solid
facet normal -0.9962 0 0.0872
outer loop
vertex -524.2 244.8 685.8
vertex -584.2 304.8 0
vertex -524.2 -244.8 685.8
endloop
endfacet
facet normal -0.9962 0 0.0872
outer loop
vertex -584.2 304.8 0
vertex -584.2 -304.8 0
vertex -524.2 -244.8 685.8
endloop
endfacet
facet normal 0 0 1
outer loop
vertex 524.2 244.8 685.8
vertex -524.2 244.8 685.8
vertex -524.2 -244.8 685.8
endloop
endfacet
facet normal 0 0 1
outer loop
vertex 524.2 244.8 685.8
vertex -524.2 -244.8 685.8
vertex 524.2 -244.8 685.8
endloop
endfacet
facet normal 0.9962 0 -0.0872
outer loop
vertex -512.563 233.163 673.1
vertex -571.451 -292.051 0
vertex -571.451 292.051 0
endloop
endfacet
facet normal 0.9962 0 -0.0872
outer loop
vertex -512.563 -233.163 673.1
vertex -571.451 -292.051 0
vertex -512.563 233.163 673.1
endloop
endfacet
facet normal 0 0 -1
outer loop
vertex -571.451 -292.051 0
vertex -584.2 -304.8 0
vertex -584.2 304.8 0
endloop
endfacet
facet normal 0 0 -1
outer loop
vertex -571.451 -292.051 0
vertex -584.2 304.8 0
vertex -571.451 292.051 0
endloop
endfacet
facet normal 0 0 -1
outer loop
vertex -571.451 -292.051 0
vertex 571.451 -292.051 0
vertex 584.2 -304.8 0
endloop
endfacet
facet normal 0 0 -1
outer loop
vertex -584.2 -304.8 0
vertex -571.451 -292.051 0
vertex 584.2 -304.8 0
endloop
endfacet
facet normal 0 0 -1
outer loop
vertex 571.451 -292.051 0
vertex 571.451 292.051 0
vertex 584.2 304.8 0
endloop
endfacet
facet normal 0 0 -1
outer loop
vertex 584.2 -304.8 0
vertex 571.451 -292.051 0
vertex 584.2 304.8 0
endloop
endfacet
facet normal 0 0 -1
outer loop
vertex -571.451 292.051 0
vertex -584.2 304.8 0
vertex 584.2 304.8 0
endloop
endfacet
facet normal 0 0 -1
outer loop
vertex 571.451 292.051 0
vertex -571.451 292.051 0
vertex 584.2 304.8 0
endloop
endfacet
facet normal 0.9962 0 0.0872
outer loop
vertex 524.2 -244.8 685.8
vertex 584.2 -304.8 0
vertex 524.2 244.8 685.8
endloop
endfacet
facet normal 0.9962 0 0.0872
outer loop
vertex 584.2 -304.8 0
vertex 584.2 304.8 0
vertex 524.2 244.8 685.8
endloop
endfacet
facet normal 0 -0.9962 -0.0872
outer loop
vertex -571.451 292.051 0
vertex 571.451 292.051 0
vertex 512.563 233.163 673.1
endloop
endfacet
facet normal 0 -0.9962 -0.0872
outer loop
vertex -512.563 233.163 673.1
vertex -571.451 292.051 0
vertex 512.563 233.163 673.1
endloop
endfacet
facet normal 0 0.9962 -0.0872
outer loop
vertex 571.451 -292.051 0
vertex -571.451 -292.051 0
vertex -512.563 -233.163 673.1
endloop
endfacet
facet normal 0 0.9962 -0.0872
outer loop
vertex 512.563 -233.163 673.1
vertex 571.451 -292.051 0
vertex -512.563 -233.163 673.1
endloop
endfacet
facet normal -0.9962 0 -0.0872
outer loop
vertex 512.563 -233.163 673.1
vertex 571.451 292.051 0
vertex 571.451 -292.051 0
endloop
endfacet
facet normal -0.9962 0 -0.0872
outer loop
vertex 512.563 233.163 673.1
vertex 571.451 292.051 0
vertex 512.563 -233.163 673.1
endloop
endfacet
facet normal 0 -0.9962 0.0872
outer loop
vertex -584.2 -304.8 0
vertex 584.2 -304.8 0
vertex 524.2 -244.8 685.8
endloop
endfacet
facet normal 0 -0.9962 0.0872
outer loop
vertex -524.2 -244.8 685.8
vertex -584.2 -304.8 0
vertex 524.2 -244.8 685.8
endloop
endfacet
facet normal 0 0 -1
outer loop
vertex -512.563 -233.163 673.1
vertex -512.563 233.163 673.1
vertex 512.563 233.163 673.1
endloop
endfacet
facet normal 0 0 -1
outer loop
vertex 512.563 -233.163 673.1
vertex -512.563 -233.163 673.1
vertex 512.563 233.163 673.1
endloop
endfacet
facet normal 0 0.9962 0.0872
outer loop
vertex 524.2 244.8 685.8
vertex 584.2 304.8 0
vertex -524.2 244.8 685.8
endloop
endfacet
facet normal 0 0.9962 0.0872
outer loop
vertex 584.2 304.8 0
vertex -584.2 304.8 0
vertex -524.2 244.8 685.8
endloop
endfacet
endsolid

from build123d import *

# Parameters (mm, degrees)
F0_W     = 1168.4
F0_H     = 609.6
F1_DEPTH = 685.8
F1_TAPER = 5
F2_T     = -12.7


with BuildPart() as f1:
    # F0 (on Top) → F1 (new body)
    with BuildSketch(Plane.XY):
        Rectangle(F0_W, F0_H)
    extrude(amount=F1_DEPTH, taper=F1_TAPER)

    # F2
    f2_openings = [f1.faces().sort_by_distance(p)[0] for p in [
        (0, 0, 0),
    ]]
    offset(amount=F2_T, openings=f2_openings)


solid = f1.part
